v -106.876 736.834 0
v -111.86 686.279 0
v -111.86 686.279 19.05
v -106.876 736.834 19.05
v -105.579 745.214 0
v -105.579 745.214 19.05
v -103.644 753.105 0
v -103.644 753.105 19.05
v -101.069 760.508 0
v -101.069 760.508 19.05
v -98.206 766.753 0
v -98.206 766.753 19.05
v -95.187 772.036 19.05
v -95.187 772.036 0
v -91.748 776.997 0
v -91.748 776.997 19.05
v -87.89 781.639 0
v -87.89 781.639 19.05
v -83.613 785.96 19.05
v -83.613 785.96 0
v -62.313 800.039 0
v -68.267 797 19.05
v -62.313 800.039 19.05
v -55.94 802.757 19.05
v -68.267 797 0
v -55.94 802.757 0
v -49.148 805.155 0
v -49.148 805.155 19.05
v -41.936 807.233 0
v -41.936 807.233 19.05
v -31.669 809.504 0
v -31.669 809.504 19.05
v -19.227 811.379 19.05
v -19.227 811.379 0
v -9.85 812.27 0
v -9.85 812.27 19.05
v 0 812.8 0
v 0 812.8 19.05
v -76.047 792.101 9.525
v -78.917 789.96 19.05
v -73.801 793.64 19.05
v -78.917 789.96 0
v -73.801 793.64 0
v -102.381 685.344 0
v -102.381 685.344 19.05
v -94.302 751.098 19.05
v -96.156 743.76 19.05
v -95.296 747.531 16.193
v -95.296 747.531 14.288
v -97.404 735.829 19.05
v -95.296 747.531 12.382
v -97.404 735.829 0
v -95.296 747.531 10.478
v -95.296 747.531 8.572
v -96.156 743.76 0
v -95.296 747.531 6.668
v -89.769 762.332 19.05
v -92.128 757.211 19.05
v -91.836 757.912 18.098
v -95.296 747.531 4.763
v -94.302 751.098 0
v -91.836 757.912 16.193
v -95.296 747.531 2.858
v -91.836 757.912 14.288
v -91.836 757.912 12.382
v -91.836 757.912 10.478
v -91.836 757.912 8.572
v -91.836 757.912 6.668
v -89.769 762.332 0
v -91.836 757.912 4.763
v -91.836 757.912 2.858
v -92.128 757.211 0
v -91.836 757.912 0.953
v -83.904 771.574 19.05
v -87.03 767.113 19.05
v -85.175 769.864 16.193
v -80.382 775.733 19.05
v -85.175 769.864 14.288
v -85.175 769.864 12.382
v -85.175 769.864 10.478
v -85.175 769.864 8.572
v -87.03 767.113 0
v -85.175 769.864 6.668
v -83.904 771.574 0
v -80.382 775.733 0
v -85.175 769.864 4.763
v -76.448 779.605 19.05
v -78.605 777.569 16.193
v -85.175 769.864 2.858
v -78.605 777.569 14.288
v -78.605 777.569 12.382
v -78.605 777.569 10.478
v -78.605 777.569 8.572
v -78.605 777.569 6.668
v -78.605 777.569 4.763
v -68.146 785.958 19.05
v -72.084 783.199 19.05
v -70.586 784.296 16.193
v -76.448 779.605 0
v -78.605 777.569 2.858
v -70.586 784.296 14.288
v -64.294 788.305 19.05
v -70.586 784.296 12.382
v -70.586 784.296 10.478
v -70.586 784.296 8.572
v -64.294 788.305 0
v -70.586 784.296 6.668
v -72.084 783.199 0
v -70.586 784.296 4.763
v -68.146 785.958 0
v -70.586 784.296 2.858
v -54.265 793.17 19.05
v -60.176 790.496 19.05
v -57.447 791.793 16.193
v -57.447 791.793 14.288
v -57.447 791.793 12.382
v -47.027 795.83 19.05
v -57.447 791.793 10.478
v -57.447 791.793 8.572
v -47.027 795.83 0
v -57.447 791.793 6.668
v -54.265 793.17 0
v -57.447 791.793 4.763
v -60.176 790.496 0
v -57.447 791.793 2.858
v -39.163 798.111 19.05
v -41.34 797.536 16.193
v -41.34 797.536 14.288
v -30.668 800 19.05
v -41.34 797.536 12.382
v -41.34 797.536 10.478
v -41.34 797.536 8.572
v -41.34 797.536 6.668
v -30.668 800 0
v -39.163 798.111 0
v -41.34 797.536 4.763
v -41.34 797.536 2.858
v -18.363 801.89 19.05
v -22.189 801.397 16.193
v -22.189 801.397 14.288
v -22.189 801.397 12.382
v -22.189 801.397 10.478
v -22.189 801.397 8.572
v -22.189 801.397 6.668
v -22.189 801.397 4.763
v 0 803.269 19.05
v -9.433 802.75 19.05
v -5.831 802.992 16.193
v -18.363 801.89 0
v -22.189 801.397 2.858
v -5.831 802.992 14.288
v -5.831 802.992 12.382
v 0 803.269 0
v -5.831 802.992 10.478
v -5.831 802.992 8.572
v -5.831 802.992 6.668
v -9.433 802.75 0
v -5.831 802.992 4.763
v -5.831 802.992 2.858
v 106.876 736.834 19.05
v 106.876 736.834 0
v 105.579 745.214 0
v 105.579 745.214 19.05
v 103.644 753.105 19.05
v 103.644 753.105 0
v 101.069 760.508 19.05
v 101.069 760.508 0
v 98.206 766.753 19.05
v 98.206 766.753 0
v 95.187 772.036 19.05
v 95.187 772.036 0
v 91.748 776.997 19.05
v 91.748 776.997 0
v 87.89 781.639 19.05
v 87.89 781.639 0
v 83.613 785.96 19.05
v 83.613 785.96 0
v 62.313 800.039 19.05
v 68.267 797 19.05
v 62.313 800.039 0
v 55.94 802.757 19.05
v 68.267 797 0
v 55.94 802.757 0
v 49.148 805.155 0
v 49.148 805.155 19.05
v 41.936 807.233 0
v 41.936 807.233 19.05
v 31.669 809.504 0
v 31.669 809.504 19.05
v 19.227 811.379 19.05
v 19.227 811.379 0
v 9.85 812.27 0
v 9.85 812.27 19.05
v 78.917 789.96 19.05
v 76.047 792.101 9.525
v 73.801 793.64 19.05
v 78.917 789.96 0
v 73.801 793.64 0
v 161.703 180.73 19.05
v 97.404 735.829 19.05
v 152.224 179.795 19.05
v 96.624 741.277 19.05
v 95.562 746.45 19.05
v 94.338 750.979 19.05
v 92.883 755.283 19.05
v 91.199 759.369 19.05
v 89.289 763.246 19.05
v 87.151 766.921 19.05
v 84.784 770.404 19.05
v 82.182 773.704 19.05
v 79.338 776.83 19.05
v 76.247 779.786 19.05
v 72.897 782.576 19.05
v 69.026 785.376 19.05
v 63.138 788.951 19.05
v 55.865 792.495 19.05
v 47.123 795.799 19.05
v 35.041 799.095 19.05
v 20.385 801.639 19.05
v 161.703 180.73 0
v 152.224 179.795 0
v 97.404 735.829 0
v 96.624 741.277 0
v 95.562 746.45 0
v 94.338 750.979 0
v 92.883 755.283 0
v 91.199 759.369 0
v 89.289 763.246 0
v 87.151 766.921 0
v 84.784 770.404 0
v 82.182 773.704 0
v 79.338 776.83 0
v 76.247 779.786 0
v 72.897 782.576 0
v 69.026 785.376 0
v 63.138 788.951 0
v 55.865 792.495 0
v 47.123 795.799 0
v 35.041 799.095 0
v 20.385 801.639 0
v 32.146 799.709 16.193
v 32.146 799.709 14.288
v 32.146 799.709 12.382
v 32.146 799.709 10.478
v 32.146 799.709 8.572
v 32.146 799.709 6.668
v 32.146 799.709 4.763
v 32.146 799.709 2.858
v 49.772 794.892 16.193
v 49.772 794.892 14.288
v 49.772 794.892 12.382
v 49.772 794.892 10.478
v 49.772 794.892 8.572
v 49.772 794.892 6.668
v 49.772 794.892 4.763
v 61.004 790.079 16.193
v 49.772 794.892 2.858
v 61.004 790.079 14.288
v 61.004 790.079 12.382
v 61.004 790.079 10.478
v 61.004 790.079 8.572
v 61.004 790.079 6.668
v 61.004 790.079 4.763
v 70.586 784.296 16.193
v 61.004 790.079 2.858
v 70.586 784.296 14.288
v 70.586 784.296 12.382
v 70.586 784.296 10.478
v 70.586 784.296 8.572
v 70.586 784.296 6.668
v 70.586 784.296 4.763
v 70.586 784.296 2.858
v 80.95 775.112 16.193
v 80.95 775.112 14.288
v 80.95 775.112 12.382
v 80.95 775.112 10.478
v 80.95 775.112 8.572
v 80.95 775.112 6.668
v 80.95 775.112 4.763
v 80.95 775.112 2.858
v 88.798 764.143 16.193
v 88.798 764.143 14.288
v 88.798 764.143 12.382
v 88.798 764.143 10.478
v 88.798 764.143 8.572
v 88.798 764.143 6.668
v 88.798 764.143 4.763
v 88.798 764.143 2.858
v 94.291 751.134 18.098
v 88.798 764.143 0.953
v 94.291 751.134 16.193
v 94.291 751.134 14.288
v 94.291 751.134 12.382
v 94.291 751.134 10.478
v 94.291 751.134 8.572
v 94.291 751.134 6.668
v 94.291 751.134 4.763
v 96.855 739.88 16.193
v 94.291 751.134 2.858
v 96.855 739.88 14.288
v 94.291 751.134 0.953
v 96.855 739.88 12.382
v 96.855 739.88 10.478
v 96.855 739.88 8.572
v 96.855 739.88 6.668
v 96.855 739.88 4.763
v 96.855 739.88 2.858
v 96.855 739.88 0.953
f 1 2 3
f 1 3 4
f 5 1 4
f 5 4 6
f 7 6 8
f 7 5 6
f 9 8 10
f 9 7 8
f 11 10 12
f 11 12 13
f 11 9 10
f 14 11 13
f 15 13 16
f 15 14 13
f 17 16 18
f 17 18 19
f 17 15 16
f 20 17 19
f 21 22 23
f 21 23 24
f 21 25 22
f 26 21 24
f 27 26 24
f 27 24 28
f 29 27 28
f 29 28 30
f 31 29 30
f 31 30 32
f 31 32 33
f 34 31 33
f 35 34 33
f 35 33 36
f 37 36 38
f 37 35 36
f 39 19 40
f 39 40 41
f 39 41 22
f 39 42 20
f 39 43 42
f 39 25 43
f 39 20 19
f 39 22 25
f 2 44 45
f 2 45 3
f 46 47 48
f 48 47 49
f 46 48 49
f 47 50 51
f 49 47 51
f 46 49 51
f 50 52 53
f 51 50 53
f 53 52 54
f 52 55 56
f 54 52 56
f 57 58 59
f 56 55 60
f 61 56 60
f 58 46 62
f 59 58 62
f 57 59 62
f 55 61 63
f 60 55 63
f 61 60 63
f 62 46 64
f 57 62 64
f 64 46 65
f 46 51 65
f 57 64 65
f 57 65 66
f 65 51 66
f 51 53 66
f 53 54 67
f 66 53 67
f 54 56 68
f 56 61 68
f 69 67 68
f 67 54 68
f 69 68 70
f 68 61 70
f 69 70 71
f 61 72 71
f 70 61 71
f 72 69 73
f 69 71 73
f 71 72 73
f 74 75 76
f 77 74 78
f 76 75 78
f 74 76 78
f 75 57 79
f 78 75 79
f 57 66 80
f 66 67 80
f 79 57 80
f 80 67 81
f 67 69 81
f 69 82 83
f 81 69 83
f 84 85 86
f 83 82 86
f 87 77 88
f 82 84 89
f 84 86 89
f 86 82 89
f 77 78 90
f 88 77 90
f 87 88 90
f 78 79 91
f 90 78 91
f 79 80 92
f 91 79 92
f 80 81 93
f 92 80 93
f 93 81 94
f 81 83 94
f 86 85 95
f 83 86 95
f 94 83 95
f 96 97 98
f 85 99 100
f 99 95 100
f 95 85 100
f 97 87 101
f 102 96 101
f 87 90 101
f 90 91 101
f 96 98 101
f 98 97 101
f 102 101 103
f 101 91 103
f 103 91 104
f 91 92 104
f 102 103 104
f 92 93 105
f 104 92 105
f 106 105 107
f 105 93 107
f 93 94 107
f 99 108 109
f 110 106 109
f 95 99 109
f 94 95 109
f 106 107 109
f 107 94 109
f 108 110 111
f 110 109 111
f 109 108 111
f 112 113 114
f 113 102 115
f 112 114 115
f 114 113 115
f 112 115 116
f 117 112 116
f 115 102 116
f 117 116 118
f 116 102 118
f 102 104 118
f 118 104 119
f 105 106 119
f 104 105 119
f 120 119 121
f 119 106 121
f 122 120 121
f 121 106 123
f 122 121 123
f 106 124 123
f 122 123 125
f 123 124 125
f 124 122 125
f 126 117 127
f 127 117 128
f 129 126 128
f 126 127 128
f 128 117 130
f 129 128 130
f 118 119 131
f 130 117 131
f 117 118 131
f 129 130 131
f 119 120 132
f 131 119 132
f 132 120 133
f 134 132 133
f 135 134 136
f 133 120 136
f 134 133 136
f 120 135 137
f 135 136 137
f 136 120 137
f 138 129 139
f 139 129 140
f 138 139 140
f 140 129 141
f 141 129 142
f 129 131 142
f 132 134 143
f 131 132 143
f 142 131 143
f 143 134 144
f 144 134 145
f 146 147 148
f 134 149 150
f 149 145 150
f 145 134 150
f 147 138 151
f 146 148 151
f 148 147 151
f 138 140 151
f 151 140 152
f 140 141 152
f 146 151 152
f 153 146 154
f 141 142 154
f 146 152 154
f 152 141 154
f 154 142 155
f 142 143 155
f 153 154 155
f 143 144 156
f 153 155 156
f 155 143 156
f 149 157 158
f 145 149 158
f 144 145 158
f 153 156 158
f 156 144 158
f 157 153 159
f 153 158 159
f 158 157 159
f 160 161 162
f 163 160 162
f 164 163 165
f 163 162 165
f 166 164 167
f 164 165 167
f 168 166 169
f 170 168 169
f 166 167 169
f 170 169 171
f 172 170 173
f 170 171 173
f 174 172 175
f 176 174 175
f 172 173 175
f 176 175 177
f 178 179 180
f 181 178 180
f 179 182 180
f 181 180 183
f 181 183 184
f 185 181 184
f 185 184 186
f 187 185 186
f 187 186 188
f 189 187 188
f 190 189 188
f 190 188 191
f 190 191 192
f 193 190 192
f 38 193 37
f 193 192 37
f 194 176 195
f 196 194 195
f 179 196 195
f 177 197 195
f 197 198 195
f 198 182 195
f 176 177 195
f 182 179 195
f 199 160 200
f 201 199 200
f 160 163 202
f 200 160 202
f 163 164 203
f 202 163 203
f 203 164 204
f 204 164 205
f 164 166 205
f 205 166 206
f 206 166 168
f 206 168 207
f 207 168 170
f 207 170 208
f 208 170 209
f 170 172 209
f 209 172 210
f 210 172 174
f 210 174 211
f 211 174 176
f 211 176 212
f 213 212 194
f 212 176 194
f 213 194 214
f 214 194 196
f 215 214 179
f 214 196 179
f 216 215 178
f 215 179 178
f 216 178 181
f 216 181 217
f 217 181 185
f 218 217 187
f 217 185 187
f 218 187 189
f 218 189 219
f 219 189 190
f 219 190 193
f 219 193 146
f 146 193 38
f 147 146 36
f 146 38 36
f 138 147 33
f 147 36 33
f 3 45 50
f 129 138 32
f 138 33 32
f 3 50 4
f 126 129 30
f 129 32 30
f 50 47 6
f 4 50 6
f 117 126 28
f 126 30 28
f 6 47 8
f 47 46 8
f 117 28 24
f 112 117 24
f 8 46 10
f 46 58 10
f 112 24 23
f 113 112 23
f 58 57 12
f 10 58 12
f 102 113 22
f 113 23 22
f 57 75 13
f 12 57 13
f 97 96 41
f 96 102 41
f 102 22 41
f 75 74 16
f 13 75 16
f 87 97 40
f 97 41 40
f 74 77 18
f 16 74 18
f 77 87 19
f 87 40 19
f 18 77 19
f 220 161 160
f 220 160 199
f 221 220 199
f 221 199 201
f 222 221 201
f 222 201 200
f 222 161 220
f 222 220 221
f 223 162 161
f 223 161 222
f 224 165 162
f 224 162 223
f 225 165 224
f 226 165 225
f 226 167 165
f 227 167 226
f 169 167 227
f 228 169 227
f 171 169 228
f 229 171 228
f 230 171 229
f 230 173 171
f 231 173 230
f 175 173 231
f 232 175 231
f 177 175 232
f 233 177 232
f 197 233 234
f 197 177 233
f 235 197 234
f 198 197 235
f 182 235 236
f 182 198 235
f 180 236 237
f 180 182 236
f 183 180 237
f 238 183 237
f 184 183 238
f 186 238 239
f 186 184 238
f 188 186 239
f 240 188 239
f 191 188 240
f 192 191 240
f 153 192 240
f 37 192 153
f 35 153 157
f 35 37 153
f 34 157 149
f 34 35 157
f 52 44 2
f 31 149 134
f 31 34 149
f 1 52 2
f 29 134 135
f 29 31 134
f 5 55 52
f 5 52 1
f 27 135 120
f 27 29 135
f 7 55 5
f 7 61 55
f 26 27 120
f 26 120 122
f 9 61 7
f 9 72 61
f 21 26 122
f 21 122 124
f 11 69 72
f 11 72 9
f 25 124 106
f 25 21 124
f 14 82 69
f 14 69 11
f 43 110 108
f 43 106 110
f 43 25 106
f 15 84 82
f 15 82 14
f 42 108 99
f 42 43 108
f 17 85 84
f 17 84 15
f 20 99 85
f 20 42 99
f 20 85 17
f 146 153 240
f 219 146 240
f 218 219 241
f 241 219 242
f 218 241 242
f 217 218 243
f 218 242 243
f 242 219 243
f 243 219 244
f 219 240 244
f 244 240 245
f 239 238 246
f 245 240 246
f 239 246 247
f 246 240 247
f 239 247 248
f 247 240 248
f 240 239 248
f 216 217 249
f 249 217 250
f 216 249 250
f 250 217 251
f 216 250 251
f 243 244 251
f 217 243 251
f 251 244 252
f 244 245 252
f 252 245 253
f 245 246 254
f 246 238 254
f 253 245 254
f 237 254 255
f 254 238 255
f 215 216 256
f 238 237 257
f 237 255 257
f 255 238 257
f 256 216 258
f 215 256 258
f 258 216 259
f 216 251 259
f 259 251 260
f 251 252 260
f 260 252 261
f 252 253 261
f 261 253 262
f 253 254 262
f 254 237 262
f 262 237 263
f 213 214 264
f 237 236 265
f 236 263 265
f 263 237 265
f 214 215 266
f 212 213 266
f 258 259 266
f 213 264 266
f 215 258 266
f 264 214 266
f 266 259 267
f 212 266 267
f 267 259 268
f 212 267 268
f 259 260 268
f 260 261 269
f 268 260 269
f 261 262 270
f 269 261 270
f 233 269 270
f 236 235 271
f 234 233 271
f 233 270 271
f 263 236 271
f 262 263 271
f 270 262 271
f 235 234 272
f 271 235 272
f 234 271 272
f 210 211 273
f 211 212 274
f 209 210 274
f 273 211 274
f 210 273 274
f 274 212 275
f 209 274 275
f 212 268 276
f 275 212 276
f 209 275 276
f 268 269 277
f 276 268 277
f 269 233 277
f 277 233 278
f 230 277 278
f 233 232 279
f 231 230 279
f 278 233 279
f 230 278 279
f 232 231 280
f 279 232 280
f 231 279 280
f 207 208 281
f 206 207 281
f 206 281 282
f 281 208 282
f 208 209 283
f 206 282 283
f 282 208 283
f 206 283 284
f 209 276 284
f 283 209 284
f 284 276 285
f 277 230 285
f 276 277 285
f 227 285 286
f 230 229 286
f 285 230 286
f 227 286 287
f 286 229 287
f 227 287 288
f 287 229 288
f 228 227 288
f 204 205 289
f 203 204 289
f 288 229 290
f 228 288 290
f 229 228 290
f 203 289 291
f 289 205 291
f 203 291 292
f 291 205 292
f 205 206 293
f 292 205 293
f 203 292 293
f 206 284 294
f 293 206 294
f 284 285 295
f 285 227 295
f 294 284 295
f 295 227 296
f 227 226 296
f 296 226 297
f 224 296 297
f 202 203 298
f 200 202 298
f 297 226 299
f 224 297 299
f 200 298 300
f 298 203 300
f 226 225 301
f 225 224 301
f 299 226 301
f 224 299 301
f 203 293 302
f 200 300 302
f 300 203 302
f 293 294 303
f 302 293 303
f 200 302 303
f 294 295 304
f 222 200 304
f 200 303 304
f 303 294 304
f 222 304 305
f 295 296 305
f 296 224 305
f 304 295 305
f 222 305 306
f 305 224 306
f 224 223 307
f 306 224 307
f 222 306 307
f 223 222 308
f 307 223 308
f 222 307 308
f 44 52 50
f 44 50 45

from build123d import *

# Parameters (mm, degrees)
BOSS_EXTRUDE1_DEPTH = 19.05


with BuildPart() as part:
    # Sketch1 → Boss-Extrude1 (new body)
    with BuildSketch(Plane.XY):
        with BuildLine():
            Line((152.224173193, 179.795336584), (97.403993572, 735.828587024))
            add(Edge.make_bspline(
                [(0, 803.26908628), (0.979817658, 803.233925105), (2.950075123, 803.151909058), (6.800362849, 802.946009068), (11.504912112, 802.608232022), (16.957304332, 802.075979486), (23.975792063, 801.198424891), (32.273128008, 799.790052384), (41.46699497, 797.614109593), (49.89784204, 794.967332344), (60.129456963, 790.832450746), (71.050790712, 784.572420078), (79.648241417, 776.932392043), (85.274313562, 769.943199813), (88.89525226, 764.228265264), (91.933130485, 758.00316425), (93.979934001, 752.359286407), (95.321414001, 747.554999291), (96.177362738, 743.805316844), (96.764020616, 740.553537606), (97.155379667, 737.881968465), (97.326205951, 736.51096636), (97.403993572, 735.828587024)],
                knots=[0.000508173, 0.000508173, 0.000508173, 0.000508173, 0.016098161, 0.031688149, 0.062868125, 0.094048101, 0.125228077, 0.187588029, 0.249947981, 0.312307933, 0.374667885, 0.499387789, 0.624107693, 0.686467645, 0.748827597, 0.811187549, 0.873547501, 0.904727477, 0.935907453, 0.967087429, 0.982677417, 0.998267405, 0.998267405, 0.998267405, 0.998267405], degree=3))
            add(Edge.make_bspline(
                [(-97.403993572, 735.828587024), (-97.326205951, 736.51096636), (-97.155379667, 737.881968465), (-96.764020616, 740.553537606), (-96.177362738, 743.805316844), (-95.321414001, 747.554999291), (-93.979934001, 752.359286407), (-91.933130485, 758.00316425), (-88.89525226, 764.228265264), (-85.274313562, 769.943199813), (-79.648241417, 776.932392043), (-71.050790712, 784.572420078), (-60.129456963, 790.832450746), (-49.89784204, 794.967332344), (-41.46699497, 797.614109593), (-32.273128008, 799.790052384), (-23.975792063, 801.198424891), (-16.957304332, 802.075979486), (-11.504912112, 802.608232022), (-6.800362849, 802.946009068), (-2.950075123, 803.151909058), (-0.979817658, 803.233925105), (0, 803.26908628)],
                knots=[0.000508173, 0.000508173, 0.000508173, 0.000508173, 0.016098161, 0.031688149, 0.062868125, 0.094048101, 0.125228077, 0.187588029, 0.249947981, 0.312307933, 0.374667885, 0.499387789, 0.624107693, 0.686467645, 0.748827597, 0.811187549, 0.873547501, 0.904727477, 0.935907453, 0.967087429, 0.982677417, 0.998267405, 0.998267405, 0.998267405, 0.998267405], degree=3))
            Line((-97.403993572, 735.828587024), (-102.381323889, 685.344236665))
            Line((-102.381323889, 685.344236665), (-111.860365766, 686.278790089))
            Line((-111.860365766, 686.278790089), (-106.876080835, 736.833680097))
            add(Edge.make_bspline(
                [(-106.876080835, 736.833680097), (-98.655564568, 809.385111394), (0, 812.8)],
                knots=[0, 0, 0, 1, 1, 1], degree=2))
            add(Edge.make_bspline(
                [(106.876080835, 736.833680097), (98.655564568, 809.385111394), (0, 812.8)],
                knots=[0, 0, 0, 1, 1, 1], degree=2))
            Line((106.876080835, 736.833680097), (161.70321507, 180.729890008))
            Line((161.70321507, 180.729890008), (152.224173193, 179.795336584))
        make_face()
    extrude(amount=BOSS_EXTRUDE1_DEPTH)


solid = part.part
